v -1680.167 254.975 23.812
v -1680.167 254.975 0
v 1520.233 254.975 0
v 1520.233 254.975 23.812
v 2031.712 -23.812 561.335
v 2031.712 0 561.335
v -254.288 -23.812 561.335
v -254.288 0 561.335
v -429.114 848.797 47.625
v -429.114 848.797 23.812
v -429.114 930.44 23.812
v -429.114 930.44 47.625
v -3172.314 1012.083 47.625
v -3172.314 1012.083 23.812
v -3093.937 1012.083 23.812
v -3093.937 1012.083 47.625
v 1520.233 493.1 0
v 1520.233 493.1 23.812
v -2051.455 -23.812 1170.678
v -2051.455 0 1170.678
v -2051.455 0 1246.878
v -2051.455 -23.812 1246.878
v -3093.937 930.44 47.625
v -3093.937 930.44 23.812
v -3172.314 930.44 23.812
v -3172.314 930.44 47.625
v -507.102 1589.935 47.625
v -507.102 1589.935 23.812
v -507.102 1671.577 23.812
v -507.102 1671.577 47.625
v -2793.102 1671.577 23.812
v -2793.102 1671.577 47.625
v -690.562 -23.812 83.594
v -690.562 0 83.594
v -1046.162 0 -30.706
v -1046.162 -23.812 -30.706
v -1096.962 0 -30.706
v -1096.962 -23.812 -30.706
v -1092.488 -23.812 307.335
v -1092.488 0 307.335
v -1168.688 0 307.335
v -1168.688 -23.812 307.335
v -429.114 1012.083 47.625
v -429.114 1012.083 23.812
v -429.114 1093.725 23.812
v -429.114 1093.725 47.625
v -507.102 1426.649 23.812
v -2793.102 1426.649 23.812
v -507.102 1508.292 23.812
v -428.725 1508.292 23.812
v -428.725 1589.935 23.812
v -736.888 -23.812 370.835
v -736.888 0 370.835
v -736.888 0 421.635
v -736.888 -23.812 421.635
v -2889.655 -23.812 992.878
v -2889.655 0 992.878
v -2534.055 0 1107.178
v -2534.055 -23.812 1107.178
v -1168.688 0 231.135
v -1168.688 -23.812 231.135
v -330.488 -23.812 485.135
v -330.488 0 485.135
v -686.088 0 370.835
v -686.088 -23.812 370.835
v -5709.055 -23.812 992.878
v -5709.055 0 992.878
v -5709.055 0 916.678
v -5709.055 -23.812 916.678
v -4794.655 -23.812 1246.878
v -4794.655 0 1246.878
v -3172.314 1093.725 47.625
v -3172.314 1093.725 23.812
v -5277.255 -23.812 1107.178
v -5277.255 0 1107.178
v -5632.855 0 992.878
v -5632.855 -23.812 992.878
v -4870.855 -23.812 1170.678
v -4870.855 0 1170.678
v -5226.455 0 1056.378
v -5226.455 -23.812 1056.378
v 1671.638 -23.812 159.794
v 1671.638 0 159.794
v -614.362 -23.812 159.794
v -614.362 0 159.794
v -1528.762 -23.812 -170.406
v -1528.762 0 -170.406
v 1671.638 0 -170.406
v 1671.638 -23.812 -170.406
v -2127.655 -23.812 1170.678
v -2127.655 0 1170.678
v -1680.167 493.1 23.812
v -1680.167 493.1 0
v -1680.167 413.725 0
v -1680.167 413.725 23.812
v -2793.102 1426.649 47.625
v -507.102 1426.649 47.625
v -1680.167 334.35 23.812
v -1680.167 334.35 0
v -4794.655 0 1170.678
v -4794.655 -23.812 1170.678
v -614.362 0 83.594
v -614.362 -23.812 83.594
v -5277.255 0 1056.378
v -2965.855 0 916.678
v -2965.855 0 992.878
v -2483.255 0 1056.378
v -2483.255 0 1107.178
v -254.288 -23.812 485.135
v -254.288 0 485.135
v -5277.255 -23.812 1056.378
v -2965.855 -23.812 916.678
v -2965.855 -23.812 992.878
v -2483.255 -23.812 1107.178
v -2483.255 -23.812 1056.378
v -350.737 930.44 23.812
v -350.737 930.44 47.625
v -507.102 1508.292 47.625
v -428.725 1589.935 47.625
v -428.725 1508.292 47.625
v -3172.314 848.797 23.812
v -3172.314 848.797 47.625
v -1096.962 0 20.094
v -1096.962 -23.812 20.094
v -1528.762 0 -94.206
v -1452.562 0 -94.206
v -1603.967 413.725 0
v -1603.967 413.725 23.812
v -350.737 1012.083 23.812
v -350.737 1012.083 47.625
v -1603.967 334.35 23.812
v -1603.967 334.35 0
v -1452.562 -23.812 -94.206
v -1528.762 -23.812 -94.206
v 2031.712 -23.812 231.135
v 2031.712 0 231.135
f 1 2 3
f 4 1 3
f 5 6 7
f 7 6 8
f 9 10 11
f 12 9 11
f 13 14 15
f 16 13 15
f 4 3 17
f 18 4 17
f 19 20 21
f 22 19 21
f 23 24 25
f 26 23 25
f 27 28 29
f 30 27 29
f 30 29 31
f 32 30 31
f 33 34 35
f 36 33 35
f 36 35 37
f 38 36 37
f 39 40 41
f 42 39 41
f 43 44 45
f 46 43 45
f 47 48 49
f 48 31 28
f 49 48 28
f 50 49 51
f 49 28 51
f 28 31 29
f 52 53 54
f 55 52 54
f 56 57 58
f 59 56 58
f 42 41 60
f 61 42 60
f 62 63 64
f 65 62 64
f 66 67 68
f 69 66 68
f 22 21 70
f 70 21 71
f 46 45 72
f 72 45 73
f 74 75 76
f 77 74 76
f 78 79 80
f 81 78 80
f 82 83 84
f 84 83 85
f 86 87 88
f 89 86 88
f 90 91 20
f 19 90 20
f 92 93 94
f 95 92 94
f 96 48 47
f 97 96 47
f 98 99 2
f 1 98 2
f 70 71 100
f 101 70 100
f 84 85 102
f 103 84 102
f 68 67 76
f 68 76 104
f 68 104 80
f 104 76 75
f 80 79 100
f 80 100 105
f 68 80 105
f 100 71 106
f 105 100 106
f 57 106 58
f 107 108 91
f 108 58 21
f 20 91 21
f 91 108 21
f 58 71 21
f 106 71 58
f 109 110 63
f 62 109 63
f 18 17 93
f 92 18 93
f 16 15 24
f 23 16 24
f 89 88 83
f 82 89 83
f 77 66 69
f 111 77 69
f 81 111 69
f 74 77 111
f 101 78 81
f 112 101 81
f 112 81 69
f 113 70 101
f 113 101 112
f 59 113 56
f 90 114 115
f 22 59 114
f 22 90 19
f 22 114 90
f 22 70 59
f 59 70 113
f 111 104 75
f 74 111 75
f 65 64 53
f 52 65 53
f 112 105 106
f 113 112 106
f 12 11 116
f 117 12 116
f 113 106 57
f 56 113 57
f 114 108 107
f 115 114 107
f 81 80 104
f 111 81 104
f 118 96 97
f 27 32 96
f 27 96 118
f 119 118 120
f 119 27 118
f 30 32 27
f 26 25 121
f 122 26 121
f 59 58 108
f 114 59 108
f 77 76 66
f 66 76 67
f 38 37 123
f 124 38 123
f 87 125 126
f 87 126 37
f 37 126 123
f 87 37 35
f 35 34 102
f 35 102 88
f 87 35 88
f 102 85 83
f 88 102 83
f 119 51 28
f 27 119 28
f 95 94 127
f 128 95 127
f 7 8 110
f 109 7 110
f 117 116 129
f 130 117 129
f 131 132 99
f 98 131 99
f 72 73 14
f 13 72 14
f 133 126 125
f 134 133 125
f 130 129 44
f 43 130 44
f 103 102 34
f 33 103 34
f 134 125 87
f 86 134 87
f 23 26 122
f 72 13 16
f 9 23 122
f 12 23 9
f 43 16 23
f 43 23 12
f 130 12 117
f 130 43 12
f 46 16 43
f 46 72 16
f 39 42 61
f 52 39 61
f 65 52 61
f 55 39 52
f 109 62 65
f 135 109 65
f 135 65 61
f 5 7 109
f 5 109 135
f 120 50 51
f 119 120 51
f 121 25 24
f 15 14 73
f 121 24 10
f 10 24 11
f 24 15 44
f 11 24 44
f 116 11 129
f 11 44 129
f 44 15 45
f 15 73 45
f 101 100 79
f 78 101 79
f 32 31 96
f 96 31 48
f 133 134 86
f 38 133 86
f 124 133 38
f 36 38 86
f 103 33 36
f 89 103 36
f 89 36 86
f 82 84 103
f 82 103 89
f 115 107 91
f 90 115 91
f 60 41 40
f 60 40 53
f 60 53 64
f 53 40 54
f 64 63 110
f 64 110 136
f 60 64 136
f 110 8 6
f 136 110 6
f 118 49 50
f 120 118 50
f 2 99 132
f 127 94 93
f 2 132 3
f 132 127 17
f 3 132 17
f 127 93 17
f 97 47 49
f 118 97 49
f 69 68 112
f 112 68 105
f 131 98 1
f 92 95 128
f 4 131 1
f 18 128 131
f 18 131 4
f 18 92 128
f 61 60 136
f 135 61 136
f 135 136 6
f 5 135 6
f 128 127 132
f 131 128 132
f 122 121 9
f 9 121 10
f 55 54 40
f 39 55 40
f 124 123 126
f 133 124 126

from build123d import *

# Parameters (mm, degrees)
F1_DEPTH = 23.8125
F3_DEPTH = 23.8125
F5_DEPTH = 23.8125
F7_DEPTH = 23.8125


with BuildPart() as f1:
    # F0 (on Front) → F1 (new body)
    with BuildSketch(Plane.XZ):
        Polygon((1671.637719, 159.794337), (-614.362281, 159.794337), (-614.362281, 83.594337), (-690.562281, 83.594337), (-1046.162281, -30.705663), (-1096.962281, -30.705663), (-1096.962281, 20.094337), (-1452.562281, -94.205663), (-1528.762281, -94.205663), (-1528.762281, -170.405663), (1671.637719, -170.405663), align=None)
        Polygon((2031.712441, 561.335063), (-254.287559, 561.335063), (-254.287559, 485.135063), (-330.487559, 485.135063), (-686.087559, 370.835063), (-736.887559, 370.835063), (-736.887559, 421.635063), (-1092.487559, 307.335063), (-1168.687559, 307.335063), (-1168.687559, 231.135063), (2031.712441, 231.135063), align=None)
    extrude(amount=F1_DEPTH)


with BuildPart() as f3:
    # F2 (on face) → F3 (new body)
    with BuildSketch(Plane.XZ):
        Polygon((-2051.454745, 1246.878364), (-4794.654745, 1246.878364), (-4794.654745, 1170.678364), (-4870.854745, 1170.678364), (-5226.454745, 1056.378364), (-5277.254745, 1056.378364), (-5277.254745, 1107.178364), (-5632.854745, 992.878364), (-5709.054745, 992.878364), (-5709.054745, 916.678364), (-2965.854745, 916.678364), (-2965.854745, 992.878364), (-2889.654745, 992.878364), (-2534.054745, 1107.178364), (-2483.254745, 1107.178364), (-2483.254745, 1056.378364), (-2127.654745, 1170.678364), (-2051.454745, 1170.678364), align=None)
    extrude(amount=F3_DEPTH)


with BuildPart() as f5:
    # F4 (on Top) → F5 (new body)
    with BuildSketch(Plane.XY):
        Polygon((1520.233008, 493.100312), (-1680.166992, 493.100312), (-1680.166992, 413.725312), (-1603.966992, 413.725312), (-1603.966992, 334.350312), (-1680.166992, 334.350312), (-1680.166992, 254.975312), (1520.233008, 254.975312), align=None)
    extrude(amount=F5_DEPTH)


with BuildPart() as f7:
    # F6 (on face) → F7 (new body)
    with BuildSketch(Plane.XY.offset(23.8125)):
        Polygon((-429.113752, 1093.725422), (-3172.313752, 1093.725422), (-3172.313752, 1012.082565), (-3093.936609, 1012.082565), (-3093.936609, 930.439708), (-3172.313752, 930.439708), (-3172.313752, 848.796851), (-429.113752, 848.796851), (-429.113752, 930.439708), (-350.736609, 930.439708), (-350.736609, 1012.082565), (-429.113752, 1012.082565), align=None)
        Polygon((-507.101898, 1671.577396), (-2793.101898, 1671.577396), (-2793.101898, 1426.648825), (-507.101898, 1426.648825), (-507.101898, 1508.291682), (-428.724755, 1508.291682), (-428.724755, 1589.934539), (-507.101898, 1589.934539), align=None)
    extrude(amount=F7_DEPTH)


solid = Compound([f1.part, f3.part, f5.part, f7.part])
